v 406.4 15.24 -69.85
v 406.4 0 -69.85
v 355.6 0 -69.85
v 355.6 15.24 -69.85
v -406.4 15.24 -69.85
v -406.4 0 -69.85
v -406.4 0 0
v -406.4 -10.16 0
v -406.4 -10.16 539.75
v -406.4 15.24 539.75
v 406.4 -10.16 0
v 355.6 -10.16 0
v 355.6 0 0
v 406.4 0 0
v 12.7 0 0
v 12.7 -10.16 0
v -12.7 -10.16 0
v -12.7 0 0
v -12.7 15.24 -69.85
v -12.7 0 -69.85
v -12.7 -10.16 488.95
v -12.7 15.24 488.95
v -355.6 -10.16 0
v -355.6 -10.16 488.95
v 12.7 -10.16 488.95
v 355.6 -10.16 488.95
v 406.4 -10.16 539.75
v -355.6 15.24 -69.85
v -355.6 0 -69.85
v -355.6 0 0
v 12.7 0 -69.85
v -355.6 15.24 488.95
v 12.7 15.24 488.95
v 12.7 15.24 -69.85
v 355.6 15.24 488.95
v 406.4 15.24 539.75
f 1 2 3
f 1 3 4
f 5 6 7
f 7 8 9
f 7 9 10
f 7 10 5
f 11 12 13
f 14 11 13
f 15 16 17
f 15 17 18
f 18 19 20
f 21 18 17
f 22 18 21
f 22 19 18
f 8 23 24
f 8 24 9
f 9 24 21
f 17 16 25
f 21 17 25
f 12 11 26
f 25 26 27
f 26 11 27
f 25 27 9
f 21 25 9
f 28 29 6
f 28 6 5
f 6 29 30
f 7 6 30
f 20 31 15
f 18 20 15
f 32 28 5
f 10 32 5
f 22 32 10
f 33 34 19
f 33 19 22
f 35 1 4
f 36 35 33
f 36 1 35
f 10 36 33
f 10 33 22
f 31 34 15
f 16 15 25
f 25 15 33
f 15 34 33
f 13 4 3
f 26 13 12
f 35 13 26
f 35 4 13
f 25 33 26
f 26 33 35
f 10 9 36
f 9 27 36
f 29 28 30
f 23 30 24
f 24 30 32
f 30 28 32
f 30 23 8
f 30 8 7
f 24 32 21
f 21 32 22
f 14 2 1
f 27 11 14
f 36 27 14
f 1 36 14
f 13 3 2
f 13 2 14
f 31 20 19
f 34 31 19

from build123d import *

# Parameters (mm, degrees)
F0_W          = 25.4
F0_H          = 609.6
F1_DEPTH      = 406.4
F2_W          = 342.9
F2_H          = 558.8
F3_DEPTH      = 15.241
F3_DEPTH_BACK = 10.161
F4_W          = 10.16
F4_H          = 69.85
F5_DEPTH      = 406.401
F5_DEPTH_BACK = 406.401


with BuildPart() as f1:
    # F0 (on Right) → F1 (new body, symmetric)
    with BuildSketch(Plane.YZ):
        with Locations((2.54, 234.95)):
            Rectangle(F0_W, F0_H)
    extrude(amount=F1_DEPTH, both=True)

    # F2 (on Front) → F3 (cut, two sides)
    with BuildSketch(Plane.XZ) as f3_sk:
        with Locations((-184.15, 209.55)):
            Rectangle(F2_W, F2_H)
        with Locations((184.15, 209.55)):
            Rectangle(F2_W, F2_H)
    extrude(amount=-F3_DEPTH, mode=Mode.SUBTRACT)
    extrude(f3_sk.sketch, amount=F3_DEPTH_BACK, mode=Mode.SUBTRACT)

    # F4 (on Right) → F5 (cut, two sides)
    with BuildSketch(Plane.YZ) as f5_sk:
        with Locations((-5.08, -34.925)):
            Rectangle(F4_W, F4_H)
    extrude(amount=-F5_DEPTH, mode=Mode.SUBTRACT)
    extrude(f5_sk.sketch, amount=F5_DEPTH_BACK, mode=Mode.SUBTRACT)


solid = f1.part
